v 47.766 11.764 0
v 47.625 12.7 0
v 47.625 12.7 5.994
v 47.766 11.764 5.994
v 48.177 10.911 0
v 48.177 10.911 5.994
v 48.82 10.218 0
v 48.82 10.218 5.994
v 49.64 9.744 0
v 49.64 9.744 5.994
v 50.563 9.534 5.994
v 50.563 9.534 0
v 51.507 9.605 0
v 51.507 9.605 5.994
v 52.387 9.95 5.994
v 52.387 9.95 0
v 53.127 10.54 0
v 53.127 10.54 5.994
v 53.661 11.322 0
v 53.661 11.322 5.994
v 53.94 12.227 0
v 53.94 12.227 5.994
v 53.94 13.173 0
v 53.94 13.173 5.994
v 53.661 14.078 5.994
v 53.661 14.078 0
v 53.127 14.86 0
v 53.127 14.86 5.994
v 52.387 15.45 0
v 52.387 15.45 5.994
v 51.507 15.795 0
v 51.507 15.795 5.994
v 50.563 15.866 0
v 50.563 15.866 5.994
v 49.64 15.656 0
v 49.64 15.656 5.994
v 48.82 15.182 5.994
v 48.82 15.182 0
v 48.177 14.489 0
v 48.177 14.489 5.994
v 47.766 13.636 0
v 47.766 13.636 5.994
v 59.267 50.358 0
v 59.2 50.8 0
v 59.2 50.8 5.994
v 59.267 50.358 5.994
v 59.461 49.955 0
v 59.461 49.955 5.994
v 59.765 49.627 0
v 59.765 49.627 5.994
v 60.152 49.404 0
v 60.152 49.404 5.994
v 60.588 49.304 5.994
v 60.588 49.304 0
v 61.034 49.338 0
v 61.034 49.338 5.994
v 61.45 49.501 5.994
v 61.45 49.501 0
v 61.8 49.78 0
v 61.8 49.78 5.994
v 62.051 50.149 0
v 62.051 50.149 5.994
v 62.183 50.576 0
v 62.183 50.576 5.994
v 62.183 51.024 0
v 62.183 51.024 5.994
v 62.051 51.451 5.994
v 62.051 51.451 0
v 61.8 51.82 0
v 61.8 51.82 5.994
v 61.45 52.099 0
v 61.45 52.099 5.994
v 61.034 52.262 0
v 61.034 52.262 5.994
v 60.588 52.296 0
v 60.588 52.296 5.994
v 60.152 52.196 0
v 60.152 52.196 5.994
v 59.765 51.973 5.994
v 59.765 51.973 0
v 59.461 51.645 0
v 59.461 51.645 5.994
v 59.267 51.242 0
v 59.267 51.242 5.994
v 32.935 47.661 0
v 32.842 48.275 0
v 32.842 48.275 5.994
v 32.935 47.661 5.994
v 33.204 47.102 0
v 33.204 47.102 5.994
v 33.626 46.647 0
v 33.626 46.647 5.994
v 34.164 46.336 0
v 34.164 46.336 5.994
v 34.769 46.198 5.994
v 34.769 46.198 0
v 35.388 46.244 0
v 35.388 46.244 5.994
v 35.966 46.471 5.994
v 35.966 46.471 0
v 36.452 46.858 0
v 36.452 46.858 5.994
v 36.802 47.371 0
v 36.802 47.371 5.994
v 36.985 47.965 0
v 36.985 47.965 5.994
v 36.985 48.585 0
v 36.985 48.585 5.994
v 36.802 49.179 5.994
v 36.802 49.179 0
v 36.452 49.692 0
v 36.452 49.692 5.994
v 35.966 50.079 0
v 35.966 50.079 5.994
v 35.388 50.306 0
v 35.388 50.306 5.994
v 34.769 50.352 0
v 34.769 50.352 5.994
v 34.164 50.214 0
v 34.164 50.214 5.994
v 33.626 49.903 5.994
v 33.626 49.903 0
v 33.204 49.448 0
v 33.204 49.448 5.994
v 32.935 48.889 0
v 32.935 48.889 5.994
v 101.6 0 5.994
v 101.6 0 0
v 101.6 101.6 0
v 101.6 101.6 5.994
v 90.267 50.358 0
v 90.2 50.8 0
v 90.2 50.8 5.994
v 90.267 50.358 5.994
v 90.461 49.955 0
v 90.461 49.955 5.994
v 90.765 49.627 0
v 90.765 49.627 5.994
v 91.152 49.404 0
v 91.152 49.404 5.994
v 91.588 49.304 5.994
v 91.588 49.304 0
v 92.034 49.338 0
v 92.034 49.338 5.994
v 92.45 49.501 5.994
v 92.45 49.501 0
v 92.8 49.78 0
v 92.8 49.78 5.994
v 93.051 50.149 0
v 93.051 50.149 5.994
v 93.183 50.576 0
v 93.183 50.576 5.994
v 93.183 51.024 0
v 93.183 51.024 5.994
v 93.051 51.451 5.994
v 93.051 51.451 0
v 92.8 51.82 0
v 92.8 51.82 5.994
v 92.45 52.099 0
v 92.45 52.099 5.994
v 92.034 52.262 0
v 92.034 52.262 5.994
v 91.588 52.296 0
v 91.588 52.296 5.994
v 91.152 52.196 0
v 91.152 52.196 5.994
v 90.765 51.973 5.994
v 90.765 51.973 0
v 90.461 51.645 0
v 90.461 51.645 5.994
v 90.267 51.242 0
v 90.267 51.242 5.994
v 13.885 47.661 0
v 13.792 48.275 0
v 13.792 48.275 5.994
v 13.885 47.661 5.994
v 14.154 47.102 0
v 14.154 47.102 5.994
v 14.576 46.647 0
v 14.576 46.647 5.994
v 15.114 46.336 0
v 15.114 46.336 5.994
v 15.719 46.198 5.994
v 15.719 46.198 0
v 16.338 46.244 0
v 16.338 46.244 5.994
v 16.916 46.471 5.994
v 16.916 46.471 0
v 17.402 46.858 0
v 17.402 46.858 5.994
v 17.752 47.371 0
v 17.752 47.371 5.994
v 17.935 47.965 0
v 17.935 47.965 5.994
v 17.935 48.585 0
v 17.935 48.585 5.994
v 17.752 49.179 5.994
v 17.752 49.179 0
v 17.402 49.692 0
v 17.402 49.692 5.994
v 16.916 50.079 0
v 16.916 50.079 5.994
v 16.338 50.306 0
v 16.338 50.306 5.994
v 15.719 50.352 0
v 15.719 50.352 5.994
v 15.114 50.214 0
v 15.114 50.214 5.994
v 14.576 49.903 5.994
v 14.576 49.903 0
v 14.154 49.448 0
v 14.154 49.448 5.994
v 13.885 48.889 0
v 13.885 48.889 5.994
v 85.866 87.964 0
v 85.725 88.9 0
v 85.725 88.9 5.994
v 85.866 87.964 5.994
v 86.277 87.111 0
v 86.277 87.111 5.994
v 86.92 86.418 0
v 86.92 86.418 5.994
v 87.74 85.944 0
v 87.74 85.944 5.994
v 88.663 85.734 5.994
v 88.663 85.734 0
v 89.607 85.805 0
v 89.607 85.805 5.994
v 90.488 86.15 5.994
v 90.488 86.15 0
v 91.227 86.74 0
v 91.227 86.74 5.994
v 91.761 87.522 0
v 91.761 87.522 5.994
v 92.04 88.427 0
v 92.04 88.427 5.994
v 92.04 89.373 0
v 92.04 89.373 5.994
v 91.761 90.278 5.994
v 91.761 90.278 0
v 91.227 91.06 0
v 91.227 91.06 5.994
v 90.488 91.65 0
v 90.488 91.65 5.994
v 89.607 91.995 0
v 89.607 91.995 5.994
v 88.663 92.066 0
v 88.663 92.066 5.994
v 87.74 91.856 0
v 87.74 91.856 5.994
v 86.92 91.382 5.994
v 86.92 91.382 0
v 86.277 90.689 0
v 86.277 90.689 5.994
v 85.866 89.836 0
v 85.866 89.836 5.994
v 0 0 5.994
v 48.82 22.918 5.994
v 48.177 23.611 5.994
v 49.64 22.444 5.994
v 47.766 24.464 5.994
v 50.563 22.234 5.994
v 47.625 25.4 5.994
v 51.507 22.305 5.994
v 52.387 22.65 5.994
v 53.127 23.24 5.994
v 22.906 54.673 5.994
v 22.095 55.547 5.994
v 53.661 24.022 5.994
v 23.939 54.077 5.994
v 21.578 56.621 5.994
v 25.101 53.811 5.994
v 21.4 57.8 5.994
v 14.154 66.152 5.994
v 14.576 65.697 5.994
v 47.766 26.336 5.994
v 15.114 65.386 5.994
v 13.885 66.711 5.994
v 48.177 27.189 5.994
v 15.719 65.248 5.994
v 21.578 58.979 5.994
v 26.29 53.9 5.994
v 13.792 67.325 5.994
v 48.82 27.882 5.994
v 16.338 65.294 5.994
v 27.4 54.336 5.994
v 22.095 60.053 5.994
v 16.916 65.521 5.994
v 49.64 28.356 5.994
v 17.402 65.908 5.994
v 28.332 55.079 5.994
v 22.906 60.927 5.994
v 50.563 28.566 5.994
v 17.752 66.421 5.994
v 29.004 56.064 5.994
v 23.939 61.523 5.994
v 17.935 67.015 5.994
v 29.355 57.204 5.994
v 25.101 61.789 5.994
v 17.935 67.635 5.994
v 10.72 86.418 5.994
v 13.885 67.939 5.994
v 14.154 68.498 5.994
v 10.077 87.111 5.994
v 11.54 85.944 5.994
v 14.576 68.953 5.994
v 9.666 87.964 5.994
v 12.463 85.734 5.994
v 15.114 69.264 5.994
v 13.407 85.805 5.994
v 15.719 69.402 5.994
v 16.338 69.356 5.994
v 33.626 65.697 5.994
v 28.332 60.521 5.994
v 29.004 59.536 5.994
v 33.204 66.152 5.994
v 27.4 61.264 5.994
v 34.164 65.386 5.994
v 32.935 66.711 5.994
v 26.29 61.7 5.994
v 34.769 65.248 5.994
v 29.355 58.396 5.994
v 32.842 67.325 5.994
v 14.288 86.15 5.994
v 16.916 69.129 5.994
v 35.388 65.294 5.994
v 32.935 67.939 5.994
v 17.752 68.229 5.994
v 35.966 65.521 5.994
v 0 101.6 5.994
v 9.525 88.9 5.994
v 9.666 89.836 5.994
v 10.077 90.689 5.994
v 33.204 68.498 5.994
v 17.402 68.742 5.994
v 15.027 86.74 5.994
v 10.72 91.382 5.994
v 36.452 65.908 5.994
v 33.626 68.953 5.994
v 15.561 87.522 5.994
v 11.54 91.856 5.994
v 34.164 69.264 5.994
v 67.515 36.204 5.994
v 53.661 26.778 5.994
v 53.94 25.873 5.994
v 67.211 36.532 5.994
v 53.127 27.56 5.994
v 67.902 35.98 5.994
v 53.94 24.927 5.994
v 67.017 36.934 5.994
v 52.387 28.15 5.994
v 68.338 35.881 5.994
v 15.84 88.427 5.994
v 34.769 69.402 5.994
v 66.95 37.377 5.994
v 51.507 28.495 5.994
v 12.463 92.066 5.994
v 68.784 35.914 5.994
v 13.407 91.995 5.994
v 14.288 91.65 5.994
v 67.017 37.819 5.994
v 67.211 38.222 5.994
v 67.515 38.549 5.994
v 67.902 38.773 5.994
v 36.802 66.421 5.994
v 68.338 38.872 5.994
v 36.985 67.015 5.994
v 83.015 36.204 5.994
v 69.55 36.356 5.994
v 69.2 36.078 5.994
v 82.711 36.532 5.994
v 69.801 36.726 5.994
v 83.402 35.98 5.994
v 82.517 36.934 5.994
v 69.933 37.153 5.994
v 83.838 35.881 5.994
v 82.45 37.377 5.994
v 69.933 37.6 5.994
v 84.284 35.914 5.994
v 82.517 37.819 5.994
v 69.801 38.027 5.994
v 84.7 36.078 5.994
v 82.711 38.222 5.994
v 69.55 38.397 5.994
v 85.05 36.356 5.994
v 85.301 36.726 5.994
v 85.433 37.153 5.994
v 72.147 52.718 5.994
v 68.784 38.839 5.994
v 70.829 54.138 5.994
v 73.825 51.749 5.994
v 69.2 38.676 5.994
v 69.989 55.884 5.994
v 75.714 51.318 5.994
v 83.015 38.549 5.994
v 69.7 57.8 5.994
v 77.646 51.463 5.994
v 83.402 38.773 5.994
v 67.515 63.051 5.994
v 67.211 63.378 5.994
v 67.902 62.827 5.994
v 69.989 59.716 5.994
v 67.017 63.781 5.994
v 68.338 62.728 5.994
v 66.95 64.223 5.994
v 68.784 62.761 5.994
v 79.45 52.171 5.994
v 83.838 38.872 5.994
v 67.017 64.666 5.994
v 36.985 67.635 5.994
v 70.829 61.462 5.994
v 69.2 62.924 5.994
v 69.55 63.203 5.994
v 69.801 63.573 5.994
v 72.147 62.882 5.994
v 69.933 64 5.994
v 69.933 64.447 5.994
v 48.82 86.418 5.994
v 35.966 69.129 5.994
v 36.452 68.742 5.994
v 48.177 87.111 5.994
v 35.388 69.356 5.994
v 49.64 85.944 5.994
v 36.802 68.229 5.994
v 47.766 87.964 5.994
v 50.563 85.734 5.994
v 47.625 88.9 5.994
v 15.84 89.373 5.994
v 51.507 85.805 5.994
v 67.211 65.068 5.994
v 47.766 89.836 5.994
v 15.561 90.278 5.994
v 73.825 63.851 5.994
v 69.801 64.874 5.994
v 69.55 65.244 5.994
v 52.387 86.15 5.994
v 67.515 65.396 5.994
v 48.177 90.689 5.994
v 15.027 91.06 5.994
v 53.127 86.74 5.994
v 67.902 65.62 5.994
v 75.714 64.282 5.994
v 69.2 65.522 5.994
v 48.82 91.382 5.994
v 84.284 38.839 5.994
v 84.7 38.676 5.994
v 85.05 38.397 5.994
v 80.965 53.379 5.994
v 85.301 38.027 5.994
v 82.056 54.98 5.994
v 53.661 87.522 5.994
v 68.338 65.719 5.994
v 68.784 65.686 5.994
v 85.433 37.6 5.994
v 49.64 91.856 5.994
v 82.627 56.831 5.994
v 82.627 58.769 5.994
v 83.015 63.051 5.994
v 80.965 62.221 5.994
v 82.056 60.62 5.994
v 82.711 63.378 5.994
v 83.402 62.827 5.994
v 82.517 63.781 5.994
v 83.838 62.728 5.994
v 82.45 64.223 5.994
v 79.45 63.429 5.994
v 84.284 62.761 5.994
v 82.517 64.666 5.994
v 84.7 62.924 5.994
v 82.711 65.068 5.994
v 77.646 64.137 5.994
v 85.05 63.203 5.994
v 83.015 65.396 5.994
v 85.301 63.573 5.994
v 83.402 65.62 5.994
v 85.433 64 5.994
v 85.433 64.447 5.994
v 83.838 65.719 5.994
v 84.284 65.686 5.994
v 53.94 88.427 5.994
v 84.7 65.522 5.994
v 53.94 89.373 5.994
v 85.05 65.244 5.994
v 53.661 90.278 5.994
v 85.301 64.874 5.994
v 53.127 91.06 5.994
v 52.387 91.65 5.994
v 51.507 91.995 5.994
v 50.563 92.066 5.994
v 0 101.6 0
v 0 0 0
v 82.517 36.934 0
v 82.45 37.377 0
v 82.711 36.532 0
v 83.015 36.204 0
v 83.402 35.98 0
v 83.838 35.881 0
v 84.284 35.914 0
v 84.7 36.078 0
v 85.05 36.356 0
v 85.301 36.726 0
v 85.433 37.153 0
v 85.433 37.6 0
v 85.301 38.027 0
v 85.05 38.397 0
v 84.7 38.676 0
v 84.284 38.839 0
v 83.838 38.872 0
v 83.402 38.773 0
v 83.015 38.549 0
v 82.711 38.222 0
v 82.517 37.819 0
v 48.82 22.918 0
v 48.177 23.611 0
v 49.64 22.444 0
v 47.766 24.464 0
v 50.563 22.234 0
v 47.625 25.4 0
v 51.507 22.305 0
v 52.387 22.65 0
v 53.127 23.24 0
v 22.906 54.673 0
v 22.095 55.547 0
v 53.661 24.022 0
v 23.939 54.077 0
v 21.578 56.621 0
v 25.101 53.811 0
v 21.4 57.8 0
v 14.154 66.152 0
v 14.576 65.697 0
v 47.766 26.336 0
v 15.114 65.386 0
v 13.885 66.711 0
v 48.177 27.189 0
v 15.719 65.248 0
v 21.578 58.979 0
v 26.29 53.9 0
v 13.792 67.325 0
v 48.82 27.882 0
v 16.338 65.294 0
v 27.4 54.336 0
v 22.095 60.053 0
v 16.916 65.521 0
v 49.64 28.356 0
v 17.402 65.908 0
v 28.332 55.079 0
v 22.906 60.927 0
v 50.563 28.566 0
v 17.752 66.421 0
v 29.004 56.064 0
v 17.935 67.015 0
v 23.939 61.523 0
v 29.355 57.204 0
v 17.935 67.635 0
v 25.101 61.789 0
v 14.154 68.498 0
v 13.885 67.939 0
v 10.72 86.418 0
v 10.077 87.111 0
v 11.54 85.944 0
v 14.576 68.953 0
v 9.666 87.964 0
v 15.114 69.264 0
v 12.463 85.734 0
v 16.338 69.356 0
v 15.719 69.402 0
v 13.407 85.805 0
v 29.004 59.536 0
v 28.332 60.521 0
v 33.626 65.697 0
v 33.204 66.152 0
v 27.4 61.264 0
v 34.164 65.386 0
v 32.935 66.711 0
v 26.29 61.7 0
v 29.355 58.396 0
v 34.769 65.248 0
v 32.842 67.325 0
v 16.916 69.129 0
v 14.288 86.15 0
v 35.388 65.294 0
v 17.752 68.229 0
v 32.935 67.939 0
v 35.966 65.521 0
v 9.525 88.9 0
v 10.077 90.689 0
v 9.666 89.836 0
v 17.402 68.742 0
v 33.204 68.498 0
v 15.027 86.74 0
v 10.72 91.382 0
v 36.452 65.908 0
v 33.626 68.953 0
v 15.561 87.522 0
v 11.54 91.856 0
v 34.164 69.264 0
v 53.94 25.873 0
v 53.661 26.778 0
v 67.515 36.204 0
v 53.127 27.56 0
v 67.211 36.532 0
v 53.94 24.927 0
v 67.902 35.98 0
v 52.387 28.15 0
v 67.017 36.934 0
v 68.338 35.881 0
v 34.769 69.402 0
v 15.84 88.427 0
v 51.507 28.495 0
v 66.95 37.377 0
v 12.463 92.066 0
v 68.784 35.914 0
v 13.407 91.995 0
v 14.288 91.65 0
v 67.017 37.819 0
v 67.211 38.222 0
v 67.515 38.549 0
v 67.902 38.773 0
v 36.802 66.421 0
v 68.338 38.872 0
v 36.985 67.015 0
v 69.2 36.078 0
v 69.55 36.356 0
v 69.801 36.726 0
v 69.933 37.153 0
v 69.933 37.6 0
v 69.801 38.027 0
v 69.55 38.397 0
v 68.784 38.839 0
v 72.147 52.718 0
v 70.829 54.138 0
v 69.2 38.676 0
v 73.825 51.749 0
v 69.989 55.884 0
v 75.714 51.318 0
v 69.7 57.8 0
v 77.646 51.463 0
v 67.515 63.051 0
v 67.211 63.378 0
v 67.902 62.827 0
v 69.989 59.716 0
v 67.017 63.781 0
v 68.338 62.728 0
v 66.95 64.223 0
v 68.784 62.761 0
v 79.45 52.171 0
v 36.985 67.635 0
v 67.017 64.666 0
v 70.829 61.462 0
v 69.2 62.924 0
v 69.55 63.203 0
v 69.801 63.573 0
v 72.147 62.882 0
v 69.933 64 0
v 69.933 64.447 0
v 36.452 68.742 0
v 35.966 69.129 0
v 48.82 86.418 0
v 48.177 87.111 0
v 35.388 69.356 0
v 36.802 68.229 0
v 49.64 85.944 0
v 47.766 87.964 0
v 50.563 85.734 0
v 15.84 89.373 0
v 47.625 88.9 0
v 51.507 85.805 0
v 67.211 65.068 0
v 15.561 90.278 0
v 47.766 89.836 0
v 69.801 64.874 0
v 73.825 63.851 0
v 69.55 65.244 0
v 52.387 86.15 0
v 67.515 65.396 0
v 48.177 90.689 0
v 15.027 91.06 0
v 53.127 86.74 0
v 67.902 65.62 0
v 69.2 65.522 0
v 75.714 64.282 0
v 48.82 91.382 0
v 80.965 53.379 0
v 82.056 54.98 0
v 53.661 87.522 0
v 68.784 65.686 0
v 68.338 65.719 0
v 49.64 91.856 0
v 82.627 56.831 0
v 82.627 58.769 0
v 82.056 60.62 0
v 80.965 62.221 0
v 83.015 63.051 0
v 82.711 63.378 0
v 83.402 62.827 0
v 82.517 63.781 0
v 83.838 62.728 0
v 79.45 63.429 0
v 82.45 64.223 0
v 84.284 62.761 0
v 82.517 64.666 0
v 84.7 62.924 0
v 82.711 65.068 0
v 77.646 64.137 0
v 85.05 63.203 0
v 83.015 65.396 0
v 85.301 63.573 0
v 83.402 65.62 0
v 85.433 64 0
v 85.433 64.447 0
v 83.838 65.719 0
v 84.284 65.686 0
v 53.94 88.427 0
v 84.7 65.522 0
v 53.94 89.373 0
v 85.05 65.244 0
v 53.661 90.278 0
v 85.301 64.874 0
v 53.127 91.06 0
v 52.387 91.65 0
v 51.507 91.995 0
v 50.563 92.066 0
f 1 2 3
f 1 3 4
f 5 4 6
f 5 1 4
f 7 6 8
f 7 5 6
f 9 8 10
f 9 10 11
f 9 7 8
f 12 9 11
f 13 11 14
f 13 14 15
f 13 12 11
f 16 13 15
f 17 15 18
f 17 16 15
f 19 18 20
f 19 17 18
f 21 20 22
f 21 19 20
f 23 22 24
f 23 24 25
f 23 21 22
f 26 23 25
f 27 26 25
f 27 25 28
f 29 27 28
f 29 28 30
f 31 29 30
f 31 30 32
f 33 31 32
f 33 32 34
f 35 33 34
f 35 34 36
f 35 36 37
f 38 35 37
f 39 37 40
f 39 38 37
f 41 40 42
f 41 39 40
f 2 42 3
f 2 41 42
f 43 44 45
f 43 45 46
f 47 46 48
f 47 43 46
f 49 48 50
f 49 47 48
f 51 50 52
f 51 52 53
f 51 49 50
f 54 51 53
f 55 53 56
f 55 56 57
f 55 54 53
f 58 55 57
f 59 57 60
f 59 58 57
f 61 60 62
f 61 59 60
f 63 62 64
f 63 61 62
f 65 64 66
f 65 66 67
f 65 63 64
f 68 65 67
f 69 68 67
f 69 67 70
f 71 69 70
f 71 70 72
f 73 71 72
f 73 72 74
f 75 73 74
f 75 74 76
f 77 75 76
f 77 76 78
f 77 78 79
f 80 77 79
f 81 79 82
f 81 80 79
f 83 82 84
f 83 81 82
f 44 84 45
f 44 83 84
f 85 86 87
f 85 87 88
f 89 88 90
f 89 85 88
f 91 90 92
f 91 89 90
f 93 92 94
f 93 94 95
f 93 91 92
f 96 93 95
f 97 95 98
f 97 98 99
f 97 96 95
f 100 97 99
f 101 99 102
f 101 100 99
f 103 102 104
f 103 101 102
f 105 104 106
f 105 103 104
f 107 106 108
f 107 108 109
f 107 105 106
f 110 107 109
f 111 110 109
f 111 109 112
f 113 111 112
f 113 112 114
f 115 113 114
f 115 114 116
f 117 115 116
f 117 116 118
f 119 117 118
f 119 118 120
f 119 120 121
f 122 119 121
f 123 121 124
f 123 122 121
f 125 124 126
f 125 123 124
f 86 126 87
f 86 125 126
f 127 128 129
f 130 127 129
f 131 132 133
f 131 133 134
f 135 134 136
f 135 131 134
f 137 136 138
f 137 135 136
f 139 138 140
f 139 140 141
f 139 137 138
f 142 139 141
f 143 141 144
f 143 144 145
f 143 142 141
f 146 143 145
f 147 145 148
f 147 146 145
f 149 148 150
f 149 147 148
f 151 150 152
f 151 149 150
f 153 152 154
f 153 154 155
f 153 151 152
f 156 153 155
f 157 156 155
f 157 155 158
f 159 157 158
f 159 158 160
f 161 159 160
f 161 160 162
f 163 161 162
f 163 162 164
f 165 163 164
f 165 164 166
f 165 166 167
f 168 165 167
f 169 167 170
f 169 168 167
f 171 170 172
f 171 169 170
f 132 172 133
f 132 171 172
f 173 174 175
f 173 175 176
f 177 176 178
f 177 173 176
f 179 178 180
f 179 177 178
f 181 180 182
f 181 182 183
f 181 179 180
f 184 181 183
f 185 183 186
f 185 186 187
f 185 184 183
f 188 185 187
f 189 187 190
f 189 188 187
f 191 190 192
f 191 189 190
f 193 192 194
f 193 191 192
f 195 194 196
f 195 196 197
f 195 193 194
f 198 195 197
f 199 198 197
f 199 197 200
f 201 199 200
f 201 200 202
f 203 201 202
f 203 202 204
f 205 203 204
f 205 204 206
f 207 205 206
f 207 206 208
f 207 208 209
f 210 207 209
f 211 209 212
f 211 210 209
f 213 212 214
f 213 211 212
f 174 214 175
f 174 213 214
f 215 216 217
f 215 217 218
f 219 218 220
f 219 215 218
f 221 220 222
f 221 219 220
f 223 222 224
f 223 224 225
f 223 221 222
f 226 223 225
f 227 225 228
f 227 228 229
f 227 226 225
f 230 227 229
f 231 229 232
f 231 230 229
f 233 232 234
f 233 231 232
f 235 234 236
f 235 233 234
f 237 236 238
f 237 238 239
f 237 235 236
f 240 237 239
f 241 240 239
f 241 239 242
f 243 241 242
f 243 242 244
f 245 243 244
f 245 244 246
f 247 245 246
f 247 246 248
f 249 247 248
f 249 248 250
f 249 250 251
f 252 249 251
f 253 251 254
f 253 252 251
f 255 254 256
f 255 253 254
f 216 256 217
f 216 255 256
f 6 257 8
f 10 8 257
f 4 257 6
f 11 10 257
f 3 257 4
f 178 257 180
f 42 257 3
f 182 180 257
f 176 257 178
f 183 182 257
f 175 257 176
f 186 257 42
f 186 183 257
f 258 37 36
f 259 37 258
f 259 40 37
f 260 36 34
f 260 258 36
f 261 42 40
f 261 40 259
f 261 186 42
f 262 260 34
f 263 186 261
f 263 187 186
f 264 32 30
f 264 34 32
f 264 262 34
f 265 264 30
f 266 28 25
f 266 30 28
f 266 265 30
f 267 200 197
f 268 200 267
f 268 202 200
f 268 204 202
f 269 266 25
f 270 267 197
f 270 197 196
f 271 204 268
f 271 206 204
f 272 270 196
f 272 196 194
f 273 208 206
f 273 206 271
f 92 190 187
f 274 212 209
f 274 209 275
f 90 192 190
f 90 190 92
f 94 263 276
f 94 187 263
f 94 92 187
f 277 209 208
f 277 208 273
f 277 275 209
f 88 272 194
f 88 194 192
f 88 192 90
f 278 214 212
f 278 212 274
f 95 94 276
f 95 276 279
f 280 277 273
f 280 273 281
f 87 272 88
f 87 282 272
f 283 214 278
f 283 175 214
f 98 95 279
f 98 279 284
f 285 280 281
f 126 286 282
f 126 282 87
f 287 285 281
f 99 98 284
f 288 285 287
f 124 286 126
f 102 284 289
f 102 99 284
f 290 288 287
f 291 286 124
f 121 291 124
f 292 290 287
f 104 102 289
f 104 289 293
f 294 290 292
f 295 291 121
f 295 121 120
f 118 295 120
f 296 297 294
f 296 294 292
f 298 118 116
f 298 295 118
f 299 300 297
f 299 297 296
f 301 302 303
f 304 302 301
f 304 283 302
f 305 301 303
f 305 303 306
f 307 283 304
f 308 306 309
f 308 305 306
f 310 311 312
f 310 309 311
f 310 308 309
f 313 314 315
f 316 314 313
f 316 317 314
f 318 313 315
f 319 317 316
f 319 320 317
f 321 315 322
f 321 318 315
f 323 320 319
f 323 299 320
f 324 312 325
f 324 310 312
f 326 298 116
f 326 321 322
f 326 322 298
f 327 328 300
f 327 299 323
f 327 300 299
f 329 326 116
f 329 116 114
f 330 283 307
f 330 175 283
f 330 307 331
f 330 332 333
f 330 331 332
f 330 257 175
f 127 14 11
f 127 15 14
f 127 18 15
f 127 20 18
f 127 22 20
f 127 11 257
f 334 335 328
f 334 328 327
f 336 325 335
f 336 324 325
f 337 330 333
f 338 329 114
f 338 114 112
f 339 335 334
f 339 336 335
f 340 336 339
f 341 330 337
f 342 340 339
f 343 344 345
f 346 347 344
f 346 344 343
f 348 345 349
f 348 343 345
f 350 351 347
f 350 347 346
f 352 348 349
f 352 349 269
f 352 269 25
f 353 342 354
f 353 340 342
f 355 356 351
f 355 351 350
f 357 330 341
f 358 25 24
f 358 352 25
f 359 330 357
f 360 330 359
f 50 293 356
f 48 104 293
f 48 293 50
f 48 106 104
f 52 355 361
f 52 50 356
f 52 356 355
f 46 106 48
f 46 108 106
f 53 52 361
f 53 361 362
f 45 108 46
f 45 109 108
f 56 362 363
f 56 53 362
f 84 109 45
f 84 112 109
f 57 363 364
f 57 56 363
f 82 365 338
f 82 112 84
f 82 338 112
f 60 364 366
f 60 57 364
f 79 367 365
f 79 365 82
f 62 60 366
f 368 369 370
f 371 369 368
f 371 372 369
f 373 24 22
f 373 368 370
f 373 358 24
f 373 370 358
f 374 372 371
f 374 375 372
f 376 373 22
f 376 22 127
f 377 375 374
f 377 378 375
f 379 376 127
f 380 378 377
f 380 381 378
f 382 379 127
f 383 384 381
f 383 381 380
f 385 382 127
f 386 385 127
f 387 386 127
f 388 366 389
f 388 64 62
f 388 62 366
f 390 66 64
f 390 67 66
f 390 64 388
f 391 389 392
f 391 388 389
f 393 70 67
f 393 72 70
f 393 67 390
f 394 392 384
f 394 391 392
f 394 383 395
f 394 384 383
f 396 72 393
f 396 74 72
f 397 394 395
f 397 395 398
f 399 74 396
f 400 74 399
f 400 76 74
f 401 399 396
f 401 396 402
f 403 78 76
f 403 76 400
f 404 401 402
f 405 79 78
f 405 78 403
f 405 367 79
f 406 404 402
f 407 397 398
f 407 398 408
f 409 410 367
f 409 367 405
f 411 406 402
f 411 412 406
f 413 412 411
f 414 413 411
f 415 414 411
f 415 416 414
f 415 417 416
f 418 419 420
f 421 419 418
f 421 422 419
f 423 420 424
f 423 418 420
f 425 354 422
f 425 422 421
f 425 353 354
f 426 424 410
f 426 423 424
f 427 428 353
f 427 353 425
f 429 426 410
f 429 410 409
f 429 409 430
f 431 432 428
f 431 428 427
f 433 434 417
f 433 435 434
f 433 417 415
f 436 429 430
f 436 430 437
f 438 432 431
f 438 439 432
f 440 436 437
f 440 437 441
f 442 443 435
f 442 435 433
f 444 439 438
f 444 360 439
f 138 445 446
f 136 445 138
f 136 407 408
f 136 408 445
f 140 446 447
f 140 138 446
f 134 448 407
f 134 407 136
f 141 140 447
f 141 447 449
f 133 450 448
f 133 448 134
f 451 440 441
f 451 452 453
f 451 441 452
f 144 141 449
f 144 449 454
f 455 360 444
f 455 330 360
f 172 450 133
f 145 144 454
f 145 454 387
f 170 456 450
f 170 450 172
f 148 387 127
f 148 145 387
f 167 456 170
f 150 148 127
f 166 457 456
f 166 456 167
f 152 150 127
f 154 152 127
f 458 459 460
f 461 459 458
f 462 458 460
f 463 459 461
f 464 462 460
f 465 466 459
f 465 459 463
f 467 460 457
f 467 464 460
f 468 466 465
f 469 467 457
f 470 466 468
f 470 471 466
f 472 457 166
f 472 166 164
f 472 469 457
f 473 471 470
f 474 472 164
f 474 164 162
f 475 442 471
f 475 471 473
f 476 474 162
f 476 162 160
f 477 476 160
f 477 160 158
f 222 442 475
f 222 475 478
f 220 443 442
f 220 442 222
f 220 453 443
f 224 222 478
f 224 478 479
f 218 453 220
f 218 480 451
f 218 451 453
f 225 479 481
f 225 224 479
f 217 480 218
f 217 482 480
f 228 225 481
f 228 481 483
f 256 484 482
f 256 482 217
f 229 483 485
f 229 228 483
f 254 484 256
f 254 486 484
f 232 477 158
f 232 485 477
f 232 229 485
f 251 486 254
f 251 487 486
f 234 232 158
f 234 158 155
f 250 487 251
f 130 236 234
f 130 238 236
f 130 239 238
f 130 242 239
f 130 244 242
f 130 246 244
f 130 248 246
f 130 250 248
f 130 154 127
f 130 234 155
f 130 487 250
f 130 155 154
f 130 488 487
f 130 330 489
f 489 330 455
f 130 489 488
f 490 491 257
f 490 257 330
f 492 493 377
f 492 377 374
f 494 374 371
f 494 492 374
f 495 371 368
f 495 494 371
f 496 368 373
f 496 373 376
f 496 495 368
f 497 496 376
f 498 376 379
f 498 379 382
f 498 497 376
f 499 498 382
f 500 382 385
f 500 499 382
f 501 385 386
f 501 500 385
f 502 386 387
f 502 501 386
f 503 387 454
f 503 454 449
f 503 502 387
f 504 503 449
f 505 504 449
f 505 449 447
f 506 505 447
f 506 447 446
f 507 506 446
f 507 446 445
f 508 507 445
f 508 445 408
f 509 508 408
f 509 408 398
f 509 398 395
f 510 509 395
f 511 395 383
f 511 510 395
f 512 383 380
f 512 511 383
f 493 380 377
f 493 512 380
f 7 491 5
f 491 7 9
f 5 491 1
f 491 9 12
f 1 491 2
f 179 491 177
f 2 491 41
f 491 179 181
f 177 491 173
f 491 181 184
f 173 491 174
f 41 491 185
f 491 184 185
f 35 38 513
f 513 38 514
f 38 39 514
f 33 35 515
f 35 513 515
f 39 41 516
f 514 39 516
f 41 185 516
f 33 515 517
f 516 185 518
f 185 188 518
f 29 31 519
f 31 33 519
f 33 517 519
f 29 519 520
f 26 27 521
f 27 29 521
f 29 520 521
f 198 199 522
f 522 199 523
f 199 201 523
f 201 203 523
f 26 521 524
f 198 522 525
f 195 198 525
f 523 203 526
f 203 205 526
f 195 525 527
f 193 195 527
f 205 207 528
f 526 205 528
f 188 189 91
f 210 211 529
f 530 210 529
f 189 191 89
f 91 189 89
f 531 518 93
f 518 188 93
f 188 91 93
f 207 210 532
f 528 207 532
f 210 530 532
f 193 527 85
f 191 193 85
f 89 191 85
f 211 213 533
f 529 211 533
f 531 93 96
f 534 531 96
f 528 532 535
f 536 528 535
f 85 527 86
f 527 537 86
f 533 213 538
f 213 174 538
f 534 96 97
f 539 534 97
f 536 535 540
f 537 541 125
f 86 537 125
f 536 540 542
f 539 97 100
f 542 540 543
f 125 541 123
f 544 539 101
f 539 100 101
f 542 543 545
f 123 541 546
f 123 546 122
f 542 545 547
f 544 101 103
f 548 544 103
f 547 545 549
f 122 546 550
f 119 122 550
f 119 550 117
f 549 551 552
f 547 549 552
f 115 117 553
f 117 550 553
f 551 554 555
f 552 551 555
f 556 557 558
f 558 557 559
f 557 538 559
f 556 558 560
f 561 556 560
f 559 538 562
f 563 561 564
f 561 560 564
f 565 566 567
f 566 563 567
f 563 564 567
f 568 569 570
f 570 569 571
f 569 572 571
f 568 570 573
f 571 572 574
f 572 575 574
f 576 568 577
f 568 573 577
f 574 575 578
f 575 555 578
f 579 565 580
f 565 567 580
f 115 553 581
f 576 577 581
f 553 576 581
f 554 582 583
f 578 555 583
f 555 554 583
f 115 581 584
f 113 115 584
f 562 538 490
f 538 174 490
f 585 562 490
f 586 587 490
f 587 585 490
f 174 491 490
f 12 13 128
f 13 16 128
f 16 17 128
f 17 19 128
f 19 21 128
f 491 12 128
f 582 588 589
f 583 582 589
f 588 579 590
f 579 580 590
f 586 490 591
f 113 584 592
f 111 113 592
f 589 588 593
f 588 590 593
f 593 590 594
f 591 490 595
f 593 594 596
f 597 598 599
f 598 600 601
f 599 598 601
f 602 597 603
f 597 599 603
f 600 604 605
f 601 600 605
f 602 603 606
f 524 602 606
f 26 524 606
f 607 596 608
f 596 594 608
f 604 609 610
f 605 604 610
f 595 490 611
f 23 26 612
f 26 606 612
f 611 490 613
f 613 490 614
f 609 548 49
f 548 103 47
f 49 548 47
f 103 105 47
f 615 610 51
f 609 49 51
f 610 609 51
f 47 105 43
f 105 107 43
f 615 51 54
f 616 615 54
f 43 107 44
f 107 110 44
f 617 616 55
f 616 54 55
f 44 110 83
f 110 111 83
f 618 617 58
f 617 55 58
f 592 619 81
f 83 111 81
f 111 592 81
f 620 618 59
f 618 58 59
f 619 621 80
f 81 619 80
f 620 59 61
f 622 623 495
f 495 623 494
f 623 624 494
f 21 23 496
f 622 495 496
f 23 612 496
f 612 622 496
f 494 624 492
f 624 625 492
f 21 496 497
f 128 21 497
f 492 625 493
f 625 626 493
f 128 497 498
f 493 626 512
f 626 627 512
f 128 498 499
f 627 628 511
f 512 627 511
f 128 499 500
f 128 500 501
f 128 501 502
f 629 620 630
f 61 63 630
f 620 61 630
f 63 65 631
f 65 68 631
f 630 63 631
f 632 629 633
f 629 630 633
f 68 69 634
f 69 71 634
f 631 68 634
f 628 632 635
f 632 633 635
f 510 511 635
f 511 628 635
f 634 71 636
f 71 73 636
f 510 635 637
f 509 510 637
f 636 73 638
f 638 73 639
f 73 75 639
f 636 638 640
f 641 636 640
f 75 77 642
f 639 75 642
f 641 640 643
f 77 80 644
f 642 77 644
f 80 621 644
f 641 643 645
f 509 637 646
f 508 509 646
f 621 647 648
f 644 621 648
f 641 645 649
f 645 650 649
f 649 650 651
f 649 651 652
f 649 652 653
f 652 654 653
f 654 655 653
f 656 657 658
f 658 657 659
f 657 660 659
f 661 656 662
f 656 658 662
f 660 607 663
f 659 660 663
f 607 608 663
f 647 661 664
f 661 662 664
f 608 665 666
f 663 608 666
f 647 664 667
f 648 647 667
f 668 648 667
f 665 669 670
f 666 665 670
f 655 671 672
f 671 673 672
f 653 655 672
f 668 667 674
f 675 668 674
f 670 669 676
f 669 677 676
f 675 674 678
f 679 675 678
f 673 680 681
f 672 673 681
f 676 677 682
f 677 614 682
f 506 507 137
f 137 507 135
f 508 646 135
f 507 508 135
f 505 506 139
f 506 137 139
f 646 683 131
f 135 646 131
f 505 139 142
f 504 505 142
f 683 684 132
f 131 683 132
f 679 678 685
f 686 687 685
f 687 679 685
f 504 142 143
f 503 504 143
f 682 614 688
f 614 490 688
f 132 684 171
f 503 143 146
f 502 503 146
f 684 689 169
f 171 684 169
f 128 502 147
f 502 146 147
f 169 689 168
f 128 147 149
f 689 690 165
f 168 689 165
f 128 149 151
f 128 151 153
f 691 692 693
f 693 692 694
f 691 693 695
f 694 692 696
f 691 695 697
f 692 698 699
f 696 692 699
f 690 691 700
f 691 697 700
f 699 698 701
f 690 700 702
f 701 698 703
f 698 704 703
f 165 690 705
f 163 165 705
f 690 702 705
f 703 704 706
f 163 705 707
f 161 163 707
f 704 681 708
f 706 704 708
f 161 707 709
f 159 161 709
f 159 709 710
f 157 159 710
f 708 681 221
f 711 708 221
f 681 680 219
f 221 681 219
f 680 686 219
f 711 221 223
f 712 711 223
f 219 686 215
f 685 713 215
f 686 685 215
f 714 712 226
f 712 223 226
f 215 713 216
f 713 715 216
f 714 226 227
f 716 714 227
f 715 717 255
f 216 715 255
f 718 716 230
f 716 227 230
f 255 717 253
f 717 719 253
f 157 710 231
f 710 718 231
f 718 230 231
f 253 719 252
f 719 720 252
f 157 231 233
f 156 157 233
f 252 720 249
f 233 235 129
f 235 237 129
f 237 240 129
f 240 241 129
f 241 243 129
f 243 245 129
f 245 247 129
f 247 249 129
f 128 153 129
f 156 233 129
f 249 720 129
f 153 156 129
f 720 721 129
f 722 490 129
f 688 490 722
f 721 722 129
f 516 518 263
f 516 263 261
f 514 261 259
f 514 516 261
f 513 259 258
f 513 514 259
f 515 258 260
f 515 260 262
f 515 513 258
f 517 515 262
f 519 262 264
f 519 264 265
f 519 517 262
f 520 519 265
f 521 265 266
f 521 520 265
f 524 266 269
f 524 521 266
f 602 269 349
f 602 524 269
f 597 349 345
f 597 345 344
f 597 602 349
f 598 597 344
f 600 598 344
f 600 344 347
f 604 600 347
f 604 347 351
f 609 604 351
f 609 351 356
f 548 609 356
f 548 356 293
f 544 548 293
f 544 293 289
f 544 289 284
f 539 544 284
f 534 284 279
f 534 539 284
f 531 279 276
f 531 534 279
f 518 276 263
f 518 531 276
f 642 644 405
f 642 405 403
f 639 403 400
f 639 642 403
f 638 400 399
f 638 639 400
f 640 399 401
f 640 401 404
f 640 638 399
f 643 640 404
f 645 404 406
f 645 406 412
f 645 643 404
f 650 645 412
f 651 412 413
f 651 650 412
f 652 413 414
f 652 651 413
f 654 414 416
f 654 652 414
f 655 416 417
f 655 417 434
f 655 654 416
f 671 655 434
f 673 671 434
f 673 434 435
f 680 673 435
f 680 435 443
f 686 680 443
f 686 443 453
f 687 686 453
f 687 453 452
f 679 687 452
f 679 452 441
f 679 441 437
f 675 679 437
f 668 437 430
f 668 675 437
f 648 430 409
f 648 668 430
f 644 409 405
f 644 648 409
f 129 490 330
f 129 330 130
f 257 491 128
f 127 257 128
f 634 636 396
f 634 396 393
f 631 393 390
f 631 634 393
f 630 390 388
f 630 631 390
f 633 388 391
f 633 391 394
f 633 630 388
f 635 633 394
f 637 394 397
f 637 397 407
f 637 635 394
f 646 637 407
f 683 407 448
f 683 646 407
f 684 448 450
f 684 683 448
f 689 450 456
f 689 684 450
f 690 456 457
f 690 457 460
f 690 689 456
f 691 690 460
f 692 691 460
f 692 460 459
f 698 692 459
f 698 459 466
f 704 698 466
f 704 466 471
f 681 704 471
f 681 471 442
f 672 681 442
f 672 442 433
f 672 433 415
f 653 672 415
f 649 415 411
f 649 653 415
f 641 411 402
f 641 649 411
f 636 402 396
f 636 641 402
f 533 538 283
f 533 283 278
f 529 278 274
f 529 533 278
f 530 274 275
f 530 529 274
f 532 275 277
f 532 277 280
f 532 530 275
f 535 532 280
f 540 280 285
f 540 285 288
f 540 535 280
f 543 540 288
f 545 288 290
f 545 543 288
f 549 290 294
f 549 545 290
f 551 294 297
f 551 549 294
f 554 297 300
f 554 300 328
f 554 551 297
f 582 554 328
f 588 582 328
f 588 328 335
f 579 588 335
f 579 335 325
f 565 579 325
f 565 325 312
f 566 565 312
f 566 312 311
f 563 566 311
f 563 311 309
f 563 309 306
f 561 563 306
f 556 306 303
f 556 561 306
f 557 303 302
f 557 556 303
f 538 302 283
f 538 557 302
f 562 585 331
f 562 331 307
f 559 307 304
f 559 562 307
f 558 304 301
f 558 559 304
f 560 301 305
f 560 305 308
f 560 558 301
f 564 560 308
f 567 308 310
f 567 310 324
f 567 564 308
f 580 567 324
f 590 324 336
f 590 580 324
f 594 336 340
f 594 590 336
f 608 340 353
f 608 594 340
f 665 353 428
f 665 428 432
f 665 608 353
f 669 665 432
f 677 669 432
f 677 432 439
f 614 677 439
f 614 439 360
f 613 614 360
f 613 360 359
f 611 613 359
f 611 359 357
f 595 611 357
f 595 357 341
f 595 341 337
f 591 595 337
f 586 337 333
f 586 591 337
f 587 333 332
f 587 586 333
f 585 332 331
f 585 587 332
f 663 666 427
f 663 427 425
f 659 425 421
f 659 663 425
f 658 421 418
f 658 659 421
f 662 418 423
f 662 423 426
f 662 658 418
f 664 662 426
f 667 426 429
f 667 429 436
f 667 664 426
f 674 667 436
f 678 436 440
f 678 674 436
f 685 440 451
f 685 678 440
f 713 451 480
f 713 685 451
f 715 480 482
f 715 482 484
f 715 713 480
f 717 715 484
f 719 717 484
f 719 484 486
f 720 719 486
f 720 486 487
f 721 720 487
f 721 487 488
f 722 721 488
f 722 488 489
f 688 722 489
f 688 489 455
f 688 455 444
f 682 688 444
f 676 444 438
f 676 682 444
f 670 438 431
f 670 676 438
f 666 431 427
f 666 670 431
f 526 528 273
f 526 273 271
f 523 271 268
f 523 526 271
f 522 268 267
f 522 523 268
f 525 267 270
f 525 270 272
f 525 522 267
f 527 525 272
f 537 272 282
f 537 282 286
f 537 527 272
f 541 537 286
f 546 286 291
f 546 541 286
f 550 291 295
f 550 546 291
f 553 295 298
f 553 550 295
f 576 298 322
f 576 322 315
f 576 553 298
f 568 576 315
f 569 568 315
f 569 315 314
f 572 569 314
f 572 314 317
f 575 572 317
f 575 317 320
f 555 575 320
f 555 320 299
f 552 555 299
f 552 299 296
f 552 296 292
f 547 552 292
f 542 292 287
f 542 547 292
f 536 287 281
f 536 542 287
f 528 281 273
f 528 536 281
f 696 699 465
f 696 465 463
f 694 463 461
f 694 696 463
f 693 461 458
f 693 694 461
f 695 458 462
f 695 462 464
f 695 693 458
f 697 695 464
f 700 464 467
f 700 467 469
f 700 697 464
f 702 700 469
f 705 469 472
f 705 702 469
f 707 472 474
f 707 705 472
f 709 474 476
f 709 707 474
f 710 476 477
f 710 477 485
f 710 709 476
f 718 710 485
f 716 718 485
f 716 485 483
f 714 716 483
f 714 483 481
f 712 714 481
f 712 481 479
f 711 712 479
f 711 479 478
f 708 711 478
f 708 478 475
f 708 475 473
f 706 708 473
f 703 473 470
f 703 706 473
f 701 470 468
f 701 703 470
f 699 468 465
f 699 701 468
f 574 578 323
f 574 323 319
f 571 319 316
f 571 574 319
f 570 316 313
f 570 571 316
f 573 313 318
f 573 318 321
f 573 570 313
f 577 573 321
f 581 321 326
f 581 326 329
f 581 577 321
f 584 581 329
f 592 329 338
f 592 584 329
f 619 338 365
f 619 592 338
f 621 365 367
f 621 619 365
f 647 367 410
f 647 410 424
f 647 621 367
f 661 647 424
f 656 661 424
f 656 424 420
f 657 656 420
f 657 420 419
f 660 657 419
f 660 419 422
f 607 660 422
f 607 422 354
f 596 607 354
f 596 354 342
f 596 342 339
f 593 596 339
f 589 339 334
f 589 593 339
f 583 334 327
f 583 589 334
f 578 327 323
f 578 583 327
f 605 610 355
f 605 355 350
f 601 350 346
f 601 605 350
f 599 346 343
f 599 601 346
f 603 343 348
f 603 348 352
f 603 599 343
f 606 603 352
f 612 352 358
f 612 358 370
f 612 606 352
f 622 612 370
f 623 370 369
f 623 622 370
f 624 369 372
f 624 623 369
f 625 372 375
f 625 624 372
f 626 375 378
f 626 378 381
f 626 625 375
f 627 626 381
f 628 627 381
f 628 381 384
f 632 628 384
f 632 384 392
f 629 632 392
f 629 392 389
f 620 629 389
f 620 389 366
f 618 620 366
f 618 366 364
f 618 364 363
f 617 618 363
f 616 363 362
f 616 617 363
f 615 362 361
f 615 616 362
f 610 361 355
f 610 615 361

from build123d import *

# Parameters (mm, degrees)
SKETCH1_W           = 101.6
SKETCH1_H           = 101.6
SKETCH1_R           = 6.5
SKETCH1_R_2         = 1.5
SKETCH1_R_3         = 3.175
SKETCH1_R_4         = 4
SKETCH1_R_5         = 2.0828
BOSS_EXTRUDE1_DEPTH = 5.9944


with BuildPart() as part:
    # Sketch1 → Boss-Extrude1 (new body)
    with BuildSketch(Plane.XY):
        with Locations((50.8, 50.8)):
            Rectangle(SKETCH1_W, SKETCH1_H)
        with Locations(Location((76.2, 57.8, 0), (0, 0, 180))):
            Circle(SKETCH1_R, mode=Mode.SUBTRACT)
        with Locations(Location((60.7, 50.8, 0), (0, 0, 180))):
            Circle(SKETCH1_R_2, mode=Mode.SUBTRACT)
        with Locations(Location((91.7, 50.8, 0), (0, 0, 180))):
            Circle(SKETCH1_R_2, mode=Mode.SUBTRACT)
        with Locations(Location((83.95, 37.376606241, 0), (0, 0, 180))):
            Circle(SKETCH1_R_2, mode=Mode.SUBTRACT)
        with Locations(Location((68.45, 37.376606241, 0), (0, 0, 180))):
            Circle(SKETCH1_R_2, mode=Mode.SUBTRACT)
        with Locations(Location((68.45, 64.223393759, 0), (0, 0, 180))):
            Circle(SKETCH1_R_2, mode=Mode.SUBTRACT)
        with Locations(Location((83.95, 64.223393759, 0), (0, 0, 180))):
            Circle(SKETCH1_R_2, mode=Mode.SUBTRACT)
        with Locations(Location((12.7, 88.9, 0), (0, 0, 180))):
            Circle(SKETCH1_R_3, mode=Mode.SUBTRACT)
        with Locations(Location((88.9, 88.9, 0), (0, 0, 180))):
            Circle(SKETCH1_R_3, mode=Mode.SUBTRACT)
        with Locations(Location((25.4, 57.8, 0), (0, 0, 180))):
            Circle(SKETCH1_R_4, mode=Mode.SUBTRACT)
        with Locations(Location((15.875, 67.325, 0), (0, 0, 180))):
            Circle(SKETCH1_R_5, mode=Mode.SUBTRACT)
        with Locations(Location((34.925, 67.325, 0), (0, 0, 180))):
            Circle(SKETCH1_R_5, mode=Mode.SUBTRACT)
        with Locations(Location((34.925, 48.275, 0), (0, 0, 180))):
            Circle(SKETCH1_R_5, mode=Mode.SUBTRACT)
        with Locations(Location((15.875, 48.275, 0), (0, 0, 180))):
            Circle(SKETCH1_R_5, mode=Mode.SUBTRACT)
        with Locations(Location((50.8, 88.9, 0), (0, 0, 180))):
            Circle(SKETCH1_R_3, mode=Mode.SUBTRACT)
        with Locations(Location((50.8, 25.4, 0), (0, 0, 180))):
            Circle(SKETCH1_R_3, mode=Mode.SUBTRACT)
        with Locations(Location((50.8, 12.7, 0), (0, 0, 180))):
            Circle(SKETCH1_R_3, mode=Mode.SUBTRACT)
    extrude(amount=BOSS_EXTRUDE1_DEPTH)


solid = part.part
